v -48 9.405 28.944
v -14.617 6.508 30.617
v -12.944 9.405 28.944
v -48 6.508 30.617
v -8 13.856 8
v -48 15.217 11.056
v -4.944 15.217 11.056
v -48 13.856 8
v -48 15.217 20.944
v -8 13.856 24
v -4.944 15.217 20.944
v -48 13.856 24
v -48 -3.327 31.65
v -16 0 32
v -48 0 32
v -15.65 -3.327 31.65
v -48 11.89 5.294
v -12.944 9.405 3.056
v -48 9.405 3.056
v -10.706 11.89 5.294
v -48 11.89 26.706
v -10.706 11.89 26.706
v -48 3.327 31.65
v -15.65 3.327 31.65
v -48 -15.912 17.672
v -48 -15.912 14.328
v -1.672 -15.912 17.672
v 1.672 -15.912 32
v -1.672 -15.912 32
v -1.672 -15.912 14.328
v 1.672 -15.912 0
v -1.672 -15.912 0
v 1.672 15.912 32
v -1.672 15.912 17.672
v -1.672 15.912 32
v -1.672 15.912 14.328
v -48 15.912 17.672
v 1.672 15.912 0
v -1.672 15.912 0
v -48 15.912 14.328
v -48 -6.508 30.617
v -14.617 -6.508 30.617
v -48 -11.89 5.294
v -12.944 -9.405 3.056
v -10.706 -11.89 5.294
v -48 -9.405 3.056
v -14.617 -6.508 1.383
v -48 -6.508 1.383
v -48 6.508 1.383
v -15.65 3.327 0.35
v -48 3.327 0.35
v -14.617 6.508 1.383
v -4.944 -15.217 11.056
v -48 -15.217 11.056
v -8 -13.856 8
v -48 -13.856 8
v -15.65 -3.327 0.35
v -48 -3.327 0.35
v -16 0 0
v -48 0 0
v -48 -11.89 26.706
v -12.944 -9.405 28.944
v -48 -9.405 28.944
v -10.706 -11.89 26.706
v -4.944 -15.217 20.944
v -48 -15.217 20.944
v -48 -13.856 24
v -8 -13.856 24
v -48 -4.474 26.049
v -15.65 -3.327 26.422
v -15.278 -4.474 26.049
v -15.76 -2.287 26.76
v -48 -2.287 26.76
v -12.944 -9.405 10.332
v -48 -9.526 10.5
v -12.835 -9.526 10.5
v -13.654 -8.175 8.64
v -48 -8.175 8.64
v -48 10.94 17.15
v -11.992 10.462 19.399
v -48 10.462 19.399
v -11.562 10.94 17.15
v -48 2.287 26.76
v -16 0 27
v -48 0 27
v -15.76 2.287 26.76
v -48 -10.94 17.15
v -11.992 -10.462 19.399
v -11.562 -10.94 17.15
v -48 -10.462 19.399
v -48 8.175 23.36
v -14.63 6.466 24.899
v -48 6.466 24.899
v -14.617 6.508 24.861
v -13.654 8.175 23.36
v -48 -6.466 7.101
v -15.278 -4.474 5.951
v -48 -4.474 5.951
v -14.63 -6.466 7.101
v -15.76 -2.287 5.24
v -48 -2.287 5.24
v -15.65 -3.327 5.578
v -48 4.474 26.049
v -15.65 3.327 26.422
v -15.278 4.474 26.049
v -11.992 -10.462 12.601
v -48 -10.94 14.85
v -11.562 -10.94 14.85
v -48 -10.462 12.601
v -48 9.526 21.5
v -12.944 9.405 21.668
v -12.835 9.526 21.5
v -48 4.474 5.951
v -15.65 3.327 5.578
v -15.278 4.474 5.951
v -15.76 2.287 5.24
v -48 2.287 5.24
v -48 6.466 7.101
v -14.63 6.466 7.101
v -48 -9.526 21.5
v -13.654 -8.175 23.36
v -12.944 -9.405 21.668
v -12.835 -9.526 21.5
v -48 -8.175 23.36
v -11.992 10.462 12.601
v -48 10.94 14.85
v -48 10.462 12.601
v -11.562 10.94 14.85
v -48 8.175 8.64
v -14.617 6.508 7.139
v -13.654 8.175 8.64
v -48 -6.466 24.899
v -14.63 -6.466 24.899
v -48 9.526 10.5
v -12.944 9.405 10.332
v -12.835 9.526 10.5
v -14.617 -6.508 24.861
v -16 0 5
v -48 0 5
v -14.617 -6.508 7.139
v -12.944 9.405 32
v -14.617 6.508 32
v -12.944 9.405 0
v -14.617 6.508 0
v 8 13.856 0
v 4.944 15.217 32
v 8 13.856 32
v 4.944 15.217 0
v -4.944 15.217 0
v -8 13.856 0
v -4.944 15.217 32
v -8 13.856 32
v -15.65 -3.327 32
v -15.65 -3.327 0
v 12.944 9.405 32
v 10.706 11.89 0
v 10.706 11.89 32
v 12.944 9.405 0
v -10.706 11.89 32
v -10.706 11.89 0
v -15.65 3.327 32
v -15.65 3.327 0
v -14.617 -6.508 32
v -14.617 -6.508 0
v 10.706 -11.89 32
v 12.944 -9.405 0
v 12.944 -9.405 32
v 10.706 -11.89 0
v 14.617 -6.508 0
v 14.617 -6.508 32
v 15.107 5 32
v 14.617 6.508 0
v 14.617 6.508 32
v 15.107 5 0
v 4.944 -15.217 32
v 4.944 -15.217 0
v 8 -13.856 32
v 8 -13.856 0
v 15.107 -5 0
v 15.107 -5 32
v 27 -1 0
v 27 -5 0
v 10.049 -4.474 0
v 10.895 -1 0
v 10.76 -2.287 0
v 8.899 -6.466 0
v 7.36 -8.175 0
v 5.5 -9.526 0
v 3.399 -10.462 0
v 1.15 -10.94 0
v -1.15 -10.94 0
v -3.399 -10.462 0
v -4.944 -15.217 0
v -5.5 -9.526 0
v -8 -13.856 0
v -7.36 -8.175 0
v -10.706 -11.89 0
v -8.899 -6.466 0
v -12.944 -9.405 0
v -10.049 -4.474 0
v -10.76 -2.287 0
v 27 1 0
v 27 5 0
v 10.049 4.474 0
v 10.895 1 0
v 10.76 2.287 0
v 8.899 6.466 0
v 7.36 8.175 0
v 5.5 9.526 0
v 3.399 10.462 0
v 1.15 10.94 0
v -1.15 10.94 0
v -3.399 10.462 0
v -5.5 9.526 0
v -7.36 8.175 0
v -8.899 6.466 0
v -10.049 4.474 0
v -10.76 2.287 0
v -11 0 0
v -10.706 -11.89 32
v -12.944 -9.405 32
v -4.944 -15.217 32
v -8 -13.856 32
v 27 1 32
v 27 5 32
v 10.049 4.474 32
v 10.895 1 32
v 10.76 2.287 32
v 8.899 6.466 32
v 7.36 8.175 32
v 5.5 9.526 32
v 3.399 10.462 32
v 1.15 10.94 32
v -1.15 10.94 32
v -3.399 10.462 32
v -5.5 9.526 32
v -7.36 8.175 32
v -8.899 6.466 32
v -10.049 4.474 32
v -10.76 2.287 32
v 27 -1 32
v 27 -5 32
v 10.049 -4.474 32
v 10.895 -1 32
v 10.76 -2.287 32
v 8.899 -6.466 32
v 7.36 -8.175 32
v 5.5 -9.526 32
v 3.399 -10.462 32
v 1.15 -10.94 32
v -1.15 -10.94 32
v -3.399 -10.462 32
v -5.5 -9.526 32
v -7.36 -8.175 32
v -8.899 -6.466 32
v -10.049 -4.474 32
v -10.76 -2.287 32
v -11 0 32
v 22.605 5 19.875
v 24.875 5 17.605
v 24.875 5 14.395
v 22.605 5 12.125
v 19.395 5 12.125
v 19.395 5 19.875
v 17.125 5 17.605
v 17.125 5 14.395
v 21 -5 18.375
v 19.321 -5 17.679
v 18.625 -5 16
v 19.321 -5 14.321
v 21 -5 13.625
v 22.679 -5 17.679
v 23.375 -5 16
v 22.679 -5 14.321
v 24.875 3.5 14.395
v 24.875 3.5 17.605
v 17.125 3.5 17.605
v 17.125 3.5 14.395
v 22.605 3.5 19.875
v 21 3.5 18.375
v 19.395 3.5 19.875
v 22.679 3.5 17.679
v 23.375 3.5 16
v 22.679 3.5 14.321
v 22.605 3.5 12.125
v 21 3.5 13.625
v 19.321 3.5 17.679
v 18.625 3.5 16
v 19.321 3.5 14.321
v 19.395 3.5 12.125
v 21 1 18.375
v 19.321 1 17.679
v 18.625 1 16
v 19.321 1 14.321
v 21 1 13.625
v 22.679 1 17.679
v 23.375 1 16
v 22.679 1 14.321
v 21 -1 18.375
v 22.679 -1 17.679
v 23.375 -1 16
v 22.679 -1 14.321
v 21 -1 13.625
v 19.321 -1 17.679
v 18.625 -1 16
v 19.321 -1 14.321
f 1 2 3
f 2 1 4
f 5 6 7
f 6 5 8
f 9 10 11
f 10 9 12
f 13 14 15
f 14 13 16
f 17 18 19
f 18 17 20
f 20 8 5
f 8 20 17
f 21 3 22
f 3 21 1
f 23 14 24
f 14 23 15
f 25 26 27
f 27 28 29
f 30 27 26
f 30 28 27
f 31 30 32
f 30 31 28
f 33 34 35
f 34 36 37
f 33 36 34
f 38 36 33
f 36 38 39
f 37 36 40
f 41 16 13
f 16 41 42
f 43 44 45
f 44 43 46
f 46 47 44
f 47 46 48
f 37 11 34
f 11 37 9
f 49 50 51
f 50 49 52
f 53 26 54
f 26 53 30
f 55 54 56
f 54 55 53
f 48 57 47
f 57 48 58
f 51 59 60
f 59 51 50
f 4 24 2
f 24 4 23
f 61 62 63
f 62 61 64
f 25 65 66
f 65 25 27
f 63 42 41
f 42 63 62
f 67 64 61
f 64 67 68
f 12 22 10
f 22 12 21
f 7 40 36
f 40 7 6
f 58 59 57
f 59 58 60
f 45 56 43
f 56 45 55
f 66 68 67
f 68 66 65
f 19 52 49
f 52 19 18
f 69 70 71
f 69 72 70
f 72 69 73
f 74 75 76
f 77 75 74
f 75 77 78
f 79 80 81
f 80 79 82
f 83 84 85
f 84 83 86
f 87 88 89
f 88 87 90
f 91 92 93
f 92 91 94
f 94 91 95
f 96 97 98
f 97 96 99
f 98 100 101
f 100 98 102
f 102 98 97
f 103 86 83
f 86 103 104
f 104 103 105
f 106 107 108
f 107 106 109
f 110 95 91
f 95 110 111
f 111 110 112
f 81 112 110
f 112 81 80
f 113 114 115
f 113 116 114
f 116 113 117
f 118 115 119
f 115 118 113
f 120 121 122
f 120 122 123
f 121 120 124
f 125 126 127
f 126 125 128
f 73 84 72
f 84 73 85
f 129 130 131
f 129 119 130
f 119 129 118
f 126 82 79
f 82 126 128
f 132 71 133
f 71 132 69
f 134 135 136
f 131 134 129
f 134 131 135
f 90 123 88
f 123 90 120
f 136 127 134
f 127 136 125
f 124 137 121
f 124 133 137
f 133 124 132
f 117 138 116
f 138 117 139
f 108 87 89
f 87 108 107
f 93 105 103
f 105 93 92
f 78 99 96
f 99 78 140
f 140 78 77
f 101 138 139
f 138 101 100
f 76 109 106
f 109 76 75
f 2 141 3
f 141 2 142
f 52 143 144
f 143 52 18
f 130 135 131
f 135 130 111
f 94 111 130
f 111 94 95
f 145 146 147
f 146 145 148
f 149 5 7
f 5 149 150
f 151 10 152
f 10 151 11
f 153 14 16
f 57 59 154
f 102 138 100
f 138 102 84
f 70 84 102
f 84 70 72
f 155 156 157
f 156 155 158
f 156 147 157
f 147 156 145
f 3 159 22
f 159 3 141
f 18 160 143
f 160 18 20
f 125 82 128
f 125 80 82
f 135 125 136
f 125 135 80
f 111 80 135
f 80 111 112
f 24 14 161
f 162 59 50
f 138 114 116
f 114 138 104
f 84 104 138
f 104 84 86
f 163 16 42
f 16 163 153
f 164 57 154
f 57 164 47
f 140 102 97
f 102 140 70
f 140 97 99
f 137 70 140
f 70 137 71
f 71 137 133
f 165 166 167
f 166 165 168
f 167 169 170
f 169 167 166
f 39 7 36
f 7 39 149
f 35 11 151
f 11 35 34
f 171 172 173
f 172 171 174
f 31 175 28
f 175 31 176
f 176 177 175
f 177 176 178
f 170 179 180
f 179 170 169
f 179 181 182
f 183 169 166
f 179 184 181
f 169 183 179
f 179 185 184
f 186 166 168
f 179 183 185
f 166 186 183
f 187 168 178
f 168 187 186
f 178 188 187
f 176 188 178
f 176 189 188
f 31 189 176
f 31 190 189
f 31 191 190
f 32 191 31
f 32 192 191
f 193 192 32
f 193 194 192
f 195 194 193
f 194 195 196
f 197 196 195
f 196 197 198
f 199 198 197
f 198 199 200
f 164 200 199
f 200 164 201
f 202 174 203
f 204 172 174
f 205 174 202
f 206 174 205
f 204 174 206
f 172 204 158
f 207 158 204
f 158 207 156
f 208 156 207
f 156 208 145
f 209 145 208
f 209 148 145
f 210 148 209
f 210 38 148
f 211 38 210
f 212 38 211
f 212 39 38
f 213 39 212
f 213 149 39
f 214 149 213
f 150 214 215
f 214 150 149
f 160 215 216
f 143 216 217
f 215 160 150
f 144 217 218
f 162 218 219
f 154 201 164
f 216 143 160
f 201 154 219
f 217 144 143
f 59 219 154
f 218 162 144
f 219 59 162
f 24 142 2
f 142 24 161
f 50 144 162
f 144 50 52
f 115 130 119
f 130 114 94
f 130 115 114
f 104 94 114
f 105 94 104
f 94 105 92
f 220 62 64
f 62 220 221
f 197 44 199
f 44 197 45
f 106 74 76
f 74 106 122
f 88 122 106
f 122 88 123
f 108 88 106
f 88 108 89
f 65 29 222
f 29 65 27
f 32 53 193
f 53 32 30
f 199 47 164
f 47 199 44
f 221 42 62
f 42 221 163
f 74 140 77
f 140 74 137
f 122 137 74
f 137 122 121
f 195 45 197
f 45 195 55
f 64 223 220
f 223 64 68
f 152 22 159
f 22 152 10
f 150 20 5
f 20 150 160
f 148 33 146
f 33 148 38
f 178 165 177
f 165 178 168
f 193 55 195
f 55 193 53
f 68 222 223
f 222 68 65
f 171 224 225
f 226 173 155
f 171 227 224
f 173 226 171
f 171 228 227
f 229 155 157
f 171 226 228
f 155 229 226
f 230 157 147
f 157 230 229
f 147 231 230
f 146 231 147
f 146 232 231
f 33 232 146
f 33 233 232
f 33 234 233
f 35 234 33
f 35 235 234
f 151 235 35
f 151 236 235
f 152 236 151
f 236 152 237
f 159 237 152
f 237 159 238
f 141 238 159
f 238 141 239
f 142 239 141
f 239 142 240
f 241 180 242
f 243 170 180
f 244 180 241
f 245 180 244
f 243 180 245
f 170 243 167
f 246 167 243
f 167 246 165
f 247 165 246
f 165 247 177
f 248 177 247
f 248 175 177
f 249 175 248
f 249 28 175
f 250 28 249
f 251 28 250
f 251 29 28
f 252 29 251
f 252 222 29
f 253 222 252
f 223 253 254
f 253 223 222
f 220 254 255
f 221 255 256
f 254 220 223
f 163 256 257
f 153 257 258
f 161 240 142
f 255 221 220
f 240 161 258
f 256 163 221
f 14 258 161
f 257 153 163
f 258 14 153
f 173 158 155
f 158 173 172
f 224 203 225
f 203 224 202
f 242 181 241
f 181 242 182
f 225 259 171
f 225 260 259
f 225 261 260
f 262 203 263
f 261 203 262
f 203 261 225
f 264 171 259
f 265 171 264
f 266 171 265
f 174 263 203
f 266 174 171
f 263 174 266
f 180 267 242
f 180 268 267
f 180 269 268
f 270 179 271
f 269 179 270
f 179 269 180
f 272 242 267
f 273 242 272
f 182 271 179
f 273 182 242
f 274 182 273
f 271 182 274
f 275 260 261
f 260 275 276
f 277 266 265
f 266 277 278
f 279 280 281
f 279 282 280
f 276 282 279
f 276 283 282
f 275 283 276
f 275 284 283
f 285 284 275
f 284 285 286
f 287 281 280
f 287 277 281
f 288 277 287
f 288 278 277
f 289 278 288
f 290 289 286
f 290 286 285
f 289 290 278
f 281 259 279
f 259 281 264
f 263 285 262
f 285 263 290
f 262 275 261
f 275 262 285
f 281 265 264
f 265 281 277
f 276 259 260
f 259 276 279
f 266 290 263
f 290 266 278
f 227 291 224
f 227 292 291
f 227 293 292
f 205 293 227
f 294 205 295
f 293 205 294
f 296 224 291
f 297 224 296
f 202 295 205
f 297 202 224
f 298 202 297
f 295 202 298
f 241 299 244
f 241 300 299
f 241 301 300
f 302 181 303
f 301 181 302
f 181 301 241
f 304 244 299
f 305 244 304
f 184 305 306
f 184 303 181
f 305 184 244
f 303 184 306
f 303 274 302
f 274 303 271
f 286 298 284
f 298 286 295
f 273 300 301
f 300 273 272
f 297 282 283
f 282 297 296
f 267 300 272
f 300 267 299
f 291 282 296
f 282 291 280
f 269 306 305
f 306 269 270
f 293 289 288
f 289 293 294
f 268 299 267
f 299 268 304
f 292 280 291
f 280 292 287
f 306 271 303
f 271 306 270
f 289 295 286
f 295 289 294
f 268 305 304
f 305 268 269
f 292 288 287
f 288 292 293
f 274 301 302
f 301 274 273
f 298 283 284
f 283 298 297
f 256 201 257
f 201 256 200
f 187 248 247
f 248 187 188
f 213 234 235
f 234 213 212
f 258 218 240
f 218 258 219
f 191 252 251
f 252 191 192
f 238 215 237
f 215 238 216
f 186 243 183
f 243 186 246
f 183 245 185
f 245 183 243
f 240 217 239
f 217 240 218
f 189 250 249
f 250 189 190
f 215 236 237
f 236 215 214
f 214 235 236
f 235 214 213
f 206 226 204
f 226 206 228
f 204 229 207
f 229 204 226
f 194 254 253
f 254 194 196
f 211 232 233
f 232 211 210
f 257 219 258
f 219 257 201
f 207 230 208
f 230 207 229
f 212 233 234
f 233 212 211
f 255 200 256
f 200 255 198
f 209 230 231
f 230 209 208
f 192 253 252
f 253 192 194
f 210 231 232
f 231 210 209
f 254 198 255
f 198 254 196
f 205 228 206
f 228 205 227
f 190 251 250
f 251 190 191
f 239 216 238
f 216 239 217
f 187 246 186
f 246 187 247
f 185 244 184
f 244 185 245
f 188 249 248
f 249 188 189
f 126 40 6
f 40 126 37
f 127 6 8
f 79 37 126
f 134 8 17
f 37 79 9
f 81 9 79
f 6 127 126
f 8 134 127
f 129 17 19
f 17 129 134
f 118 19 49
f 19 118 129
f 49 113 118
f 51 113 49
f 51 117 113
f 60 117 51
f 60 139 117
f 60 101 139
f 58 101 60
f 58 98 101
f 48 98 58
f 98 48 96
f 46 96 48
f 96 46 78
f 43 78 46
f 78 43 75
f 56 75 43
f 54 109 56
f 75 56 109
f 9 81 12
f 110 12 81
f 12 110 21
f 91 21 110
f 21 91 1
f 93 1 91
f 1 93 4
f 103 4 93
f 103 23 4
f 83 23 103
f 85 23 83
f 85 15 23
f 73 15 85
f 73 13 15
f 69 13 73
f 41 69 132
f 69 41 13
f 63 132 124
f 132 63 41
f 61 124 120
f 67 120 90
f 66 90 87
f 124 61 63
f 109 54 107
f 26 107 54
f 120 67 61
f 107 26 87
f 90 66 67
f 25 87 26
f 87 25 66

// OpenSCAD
// RollerDog Wheel Adapters

arm_length=20;
nut_size=7.75;
bolt_diameter=4.75;
cube_size=32;
top_lip_height=11;
lip_width=10;
wheel_bolt_diameter=18;
bearing_diameter=22.5;
edge_room=3;
pipe_diameter=22;

module nut() {
	intersection_for (i=[0,45]) {
		rotate([i,0])
			cube([3,nut_size,nut_size],center=true);
	}
}

module pvc_pipe() {
	rotate([0,90,0])
		cylinder(d=pipe_diameter,h=40,center=true);
}

module bearing() {
	cylinder(d=bearing_diameter,h=10,center=true);
}


module tube() {
	difference() {
		rotate([00,90,0])
			cylinder(d=cube_size,h=cube_size,center=true);
		pvc_pipe();
	}
}

module clamp() {
	difference() {
		union() {
			rotate([00,90,0])
				cylinder(d=cube_size,h=cube_size,center=true);
			translate([0,0,(top_lip_height+cube_size/2)/2])
				cube([cube_size,lip_width,top_lip_height+cube_size/2],center=true);
			translate([0,0,-cube_size/2])
			rotate([0,90,0])
				tube();
		}
		// Gap
		translate([0,0,20])
			cube([35,2,40],center=true);
		// Nut Hole
		translate([0,5,cube_size/2+top_lip_height/2-0.5])
			rotate([0,0,90]) 
				nut();
		// Bolt Hole
		translate([0,0,cube_size/2+top_lip_height/2-0.5])
			rotate([90,0,0]) 
				cylinder(d=bolt_diameter,h=20,center=true);
		// Pipe Hole
		pvc_pipe();
	}
}


module t_joint() {
	translate([0,0,cube_size/2])
	rotate([0,90,0])
		clamp();
	translate([-cube_size,0,cube_size/2])
		tube();
}

t_joint();
